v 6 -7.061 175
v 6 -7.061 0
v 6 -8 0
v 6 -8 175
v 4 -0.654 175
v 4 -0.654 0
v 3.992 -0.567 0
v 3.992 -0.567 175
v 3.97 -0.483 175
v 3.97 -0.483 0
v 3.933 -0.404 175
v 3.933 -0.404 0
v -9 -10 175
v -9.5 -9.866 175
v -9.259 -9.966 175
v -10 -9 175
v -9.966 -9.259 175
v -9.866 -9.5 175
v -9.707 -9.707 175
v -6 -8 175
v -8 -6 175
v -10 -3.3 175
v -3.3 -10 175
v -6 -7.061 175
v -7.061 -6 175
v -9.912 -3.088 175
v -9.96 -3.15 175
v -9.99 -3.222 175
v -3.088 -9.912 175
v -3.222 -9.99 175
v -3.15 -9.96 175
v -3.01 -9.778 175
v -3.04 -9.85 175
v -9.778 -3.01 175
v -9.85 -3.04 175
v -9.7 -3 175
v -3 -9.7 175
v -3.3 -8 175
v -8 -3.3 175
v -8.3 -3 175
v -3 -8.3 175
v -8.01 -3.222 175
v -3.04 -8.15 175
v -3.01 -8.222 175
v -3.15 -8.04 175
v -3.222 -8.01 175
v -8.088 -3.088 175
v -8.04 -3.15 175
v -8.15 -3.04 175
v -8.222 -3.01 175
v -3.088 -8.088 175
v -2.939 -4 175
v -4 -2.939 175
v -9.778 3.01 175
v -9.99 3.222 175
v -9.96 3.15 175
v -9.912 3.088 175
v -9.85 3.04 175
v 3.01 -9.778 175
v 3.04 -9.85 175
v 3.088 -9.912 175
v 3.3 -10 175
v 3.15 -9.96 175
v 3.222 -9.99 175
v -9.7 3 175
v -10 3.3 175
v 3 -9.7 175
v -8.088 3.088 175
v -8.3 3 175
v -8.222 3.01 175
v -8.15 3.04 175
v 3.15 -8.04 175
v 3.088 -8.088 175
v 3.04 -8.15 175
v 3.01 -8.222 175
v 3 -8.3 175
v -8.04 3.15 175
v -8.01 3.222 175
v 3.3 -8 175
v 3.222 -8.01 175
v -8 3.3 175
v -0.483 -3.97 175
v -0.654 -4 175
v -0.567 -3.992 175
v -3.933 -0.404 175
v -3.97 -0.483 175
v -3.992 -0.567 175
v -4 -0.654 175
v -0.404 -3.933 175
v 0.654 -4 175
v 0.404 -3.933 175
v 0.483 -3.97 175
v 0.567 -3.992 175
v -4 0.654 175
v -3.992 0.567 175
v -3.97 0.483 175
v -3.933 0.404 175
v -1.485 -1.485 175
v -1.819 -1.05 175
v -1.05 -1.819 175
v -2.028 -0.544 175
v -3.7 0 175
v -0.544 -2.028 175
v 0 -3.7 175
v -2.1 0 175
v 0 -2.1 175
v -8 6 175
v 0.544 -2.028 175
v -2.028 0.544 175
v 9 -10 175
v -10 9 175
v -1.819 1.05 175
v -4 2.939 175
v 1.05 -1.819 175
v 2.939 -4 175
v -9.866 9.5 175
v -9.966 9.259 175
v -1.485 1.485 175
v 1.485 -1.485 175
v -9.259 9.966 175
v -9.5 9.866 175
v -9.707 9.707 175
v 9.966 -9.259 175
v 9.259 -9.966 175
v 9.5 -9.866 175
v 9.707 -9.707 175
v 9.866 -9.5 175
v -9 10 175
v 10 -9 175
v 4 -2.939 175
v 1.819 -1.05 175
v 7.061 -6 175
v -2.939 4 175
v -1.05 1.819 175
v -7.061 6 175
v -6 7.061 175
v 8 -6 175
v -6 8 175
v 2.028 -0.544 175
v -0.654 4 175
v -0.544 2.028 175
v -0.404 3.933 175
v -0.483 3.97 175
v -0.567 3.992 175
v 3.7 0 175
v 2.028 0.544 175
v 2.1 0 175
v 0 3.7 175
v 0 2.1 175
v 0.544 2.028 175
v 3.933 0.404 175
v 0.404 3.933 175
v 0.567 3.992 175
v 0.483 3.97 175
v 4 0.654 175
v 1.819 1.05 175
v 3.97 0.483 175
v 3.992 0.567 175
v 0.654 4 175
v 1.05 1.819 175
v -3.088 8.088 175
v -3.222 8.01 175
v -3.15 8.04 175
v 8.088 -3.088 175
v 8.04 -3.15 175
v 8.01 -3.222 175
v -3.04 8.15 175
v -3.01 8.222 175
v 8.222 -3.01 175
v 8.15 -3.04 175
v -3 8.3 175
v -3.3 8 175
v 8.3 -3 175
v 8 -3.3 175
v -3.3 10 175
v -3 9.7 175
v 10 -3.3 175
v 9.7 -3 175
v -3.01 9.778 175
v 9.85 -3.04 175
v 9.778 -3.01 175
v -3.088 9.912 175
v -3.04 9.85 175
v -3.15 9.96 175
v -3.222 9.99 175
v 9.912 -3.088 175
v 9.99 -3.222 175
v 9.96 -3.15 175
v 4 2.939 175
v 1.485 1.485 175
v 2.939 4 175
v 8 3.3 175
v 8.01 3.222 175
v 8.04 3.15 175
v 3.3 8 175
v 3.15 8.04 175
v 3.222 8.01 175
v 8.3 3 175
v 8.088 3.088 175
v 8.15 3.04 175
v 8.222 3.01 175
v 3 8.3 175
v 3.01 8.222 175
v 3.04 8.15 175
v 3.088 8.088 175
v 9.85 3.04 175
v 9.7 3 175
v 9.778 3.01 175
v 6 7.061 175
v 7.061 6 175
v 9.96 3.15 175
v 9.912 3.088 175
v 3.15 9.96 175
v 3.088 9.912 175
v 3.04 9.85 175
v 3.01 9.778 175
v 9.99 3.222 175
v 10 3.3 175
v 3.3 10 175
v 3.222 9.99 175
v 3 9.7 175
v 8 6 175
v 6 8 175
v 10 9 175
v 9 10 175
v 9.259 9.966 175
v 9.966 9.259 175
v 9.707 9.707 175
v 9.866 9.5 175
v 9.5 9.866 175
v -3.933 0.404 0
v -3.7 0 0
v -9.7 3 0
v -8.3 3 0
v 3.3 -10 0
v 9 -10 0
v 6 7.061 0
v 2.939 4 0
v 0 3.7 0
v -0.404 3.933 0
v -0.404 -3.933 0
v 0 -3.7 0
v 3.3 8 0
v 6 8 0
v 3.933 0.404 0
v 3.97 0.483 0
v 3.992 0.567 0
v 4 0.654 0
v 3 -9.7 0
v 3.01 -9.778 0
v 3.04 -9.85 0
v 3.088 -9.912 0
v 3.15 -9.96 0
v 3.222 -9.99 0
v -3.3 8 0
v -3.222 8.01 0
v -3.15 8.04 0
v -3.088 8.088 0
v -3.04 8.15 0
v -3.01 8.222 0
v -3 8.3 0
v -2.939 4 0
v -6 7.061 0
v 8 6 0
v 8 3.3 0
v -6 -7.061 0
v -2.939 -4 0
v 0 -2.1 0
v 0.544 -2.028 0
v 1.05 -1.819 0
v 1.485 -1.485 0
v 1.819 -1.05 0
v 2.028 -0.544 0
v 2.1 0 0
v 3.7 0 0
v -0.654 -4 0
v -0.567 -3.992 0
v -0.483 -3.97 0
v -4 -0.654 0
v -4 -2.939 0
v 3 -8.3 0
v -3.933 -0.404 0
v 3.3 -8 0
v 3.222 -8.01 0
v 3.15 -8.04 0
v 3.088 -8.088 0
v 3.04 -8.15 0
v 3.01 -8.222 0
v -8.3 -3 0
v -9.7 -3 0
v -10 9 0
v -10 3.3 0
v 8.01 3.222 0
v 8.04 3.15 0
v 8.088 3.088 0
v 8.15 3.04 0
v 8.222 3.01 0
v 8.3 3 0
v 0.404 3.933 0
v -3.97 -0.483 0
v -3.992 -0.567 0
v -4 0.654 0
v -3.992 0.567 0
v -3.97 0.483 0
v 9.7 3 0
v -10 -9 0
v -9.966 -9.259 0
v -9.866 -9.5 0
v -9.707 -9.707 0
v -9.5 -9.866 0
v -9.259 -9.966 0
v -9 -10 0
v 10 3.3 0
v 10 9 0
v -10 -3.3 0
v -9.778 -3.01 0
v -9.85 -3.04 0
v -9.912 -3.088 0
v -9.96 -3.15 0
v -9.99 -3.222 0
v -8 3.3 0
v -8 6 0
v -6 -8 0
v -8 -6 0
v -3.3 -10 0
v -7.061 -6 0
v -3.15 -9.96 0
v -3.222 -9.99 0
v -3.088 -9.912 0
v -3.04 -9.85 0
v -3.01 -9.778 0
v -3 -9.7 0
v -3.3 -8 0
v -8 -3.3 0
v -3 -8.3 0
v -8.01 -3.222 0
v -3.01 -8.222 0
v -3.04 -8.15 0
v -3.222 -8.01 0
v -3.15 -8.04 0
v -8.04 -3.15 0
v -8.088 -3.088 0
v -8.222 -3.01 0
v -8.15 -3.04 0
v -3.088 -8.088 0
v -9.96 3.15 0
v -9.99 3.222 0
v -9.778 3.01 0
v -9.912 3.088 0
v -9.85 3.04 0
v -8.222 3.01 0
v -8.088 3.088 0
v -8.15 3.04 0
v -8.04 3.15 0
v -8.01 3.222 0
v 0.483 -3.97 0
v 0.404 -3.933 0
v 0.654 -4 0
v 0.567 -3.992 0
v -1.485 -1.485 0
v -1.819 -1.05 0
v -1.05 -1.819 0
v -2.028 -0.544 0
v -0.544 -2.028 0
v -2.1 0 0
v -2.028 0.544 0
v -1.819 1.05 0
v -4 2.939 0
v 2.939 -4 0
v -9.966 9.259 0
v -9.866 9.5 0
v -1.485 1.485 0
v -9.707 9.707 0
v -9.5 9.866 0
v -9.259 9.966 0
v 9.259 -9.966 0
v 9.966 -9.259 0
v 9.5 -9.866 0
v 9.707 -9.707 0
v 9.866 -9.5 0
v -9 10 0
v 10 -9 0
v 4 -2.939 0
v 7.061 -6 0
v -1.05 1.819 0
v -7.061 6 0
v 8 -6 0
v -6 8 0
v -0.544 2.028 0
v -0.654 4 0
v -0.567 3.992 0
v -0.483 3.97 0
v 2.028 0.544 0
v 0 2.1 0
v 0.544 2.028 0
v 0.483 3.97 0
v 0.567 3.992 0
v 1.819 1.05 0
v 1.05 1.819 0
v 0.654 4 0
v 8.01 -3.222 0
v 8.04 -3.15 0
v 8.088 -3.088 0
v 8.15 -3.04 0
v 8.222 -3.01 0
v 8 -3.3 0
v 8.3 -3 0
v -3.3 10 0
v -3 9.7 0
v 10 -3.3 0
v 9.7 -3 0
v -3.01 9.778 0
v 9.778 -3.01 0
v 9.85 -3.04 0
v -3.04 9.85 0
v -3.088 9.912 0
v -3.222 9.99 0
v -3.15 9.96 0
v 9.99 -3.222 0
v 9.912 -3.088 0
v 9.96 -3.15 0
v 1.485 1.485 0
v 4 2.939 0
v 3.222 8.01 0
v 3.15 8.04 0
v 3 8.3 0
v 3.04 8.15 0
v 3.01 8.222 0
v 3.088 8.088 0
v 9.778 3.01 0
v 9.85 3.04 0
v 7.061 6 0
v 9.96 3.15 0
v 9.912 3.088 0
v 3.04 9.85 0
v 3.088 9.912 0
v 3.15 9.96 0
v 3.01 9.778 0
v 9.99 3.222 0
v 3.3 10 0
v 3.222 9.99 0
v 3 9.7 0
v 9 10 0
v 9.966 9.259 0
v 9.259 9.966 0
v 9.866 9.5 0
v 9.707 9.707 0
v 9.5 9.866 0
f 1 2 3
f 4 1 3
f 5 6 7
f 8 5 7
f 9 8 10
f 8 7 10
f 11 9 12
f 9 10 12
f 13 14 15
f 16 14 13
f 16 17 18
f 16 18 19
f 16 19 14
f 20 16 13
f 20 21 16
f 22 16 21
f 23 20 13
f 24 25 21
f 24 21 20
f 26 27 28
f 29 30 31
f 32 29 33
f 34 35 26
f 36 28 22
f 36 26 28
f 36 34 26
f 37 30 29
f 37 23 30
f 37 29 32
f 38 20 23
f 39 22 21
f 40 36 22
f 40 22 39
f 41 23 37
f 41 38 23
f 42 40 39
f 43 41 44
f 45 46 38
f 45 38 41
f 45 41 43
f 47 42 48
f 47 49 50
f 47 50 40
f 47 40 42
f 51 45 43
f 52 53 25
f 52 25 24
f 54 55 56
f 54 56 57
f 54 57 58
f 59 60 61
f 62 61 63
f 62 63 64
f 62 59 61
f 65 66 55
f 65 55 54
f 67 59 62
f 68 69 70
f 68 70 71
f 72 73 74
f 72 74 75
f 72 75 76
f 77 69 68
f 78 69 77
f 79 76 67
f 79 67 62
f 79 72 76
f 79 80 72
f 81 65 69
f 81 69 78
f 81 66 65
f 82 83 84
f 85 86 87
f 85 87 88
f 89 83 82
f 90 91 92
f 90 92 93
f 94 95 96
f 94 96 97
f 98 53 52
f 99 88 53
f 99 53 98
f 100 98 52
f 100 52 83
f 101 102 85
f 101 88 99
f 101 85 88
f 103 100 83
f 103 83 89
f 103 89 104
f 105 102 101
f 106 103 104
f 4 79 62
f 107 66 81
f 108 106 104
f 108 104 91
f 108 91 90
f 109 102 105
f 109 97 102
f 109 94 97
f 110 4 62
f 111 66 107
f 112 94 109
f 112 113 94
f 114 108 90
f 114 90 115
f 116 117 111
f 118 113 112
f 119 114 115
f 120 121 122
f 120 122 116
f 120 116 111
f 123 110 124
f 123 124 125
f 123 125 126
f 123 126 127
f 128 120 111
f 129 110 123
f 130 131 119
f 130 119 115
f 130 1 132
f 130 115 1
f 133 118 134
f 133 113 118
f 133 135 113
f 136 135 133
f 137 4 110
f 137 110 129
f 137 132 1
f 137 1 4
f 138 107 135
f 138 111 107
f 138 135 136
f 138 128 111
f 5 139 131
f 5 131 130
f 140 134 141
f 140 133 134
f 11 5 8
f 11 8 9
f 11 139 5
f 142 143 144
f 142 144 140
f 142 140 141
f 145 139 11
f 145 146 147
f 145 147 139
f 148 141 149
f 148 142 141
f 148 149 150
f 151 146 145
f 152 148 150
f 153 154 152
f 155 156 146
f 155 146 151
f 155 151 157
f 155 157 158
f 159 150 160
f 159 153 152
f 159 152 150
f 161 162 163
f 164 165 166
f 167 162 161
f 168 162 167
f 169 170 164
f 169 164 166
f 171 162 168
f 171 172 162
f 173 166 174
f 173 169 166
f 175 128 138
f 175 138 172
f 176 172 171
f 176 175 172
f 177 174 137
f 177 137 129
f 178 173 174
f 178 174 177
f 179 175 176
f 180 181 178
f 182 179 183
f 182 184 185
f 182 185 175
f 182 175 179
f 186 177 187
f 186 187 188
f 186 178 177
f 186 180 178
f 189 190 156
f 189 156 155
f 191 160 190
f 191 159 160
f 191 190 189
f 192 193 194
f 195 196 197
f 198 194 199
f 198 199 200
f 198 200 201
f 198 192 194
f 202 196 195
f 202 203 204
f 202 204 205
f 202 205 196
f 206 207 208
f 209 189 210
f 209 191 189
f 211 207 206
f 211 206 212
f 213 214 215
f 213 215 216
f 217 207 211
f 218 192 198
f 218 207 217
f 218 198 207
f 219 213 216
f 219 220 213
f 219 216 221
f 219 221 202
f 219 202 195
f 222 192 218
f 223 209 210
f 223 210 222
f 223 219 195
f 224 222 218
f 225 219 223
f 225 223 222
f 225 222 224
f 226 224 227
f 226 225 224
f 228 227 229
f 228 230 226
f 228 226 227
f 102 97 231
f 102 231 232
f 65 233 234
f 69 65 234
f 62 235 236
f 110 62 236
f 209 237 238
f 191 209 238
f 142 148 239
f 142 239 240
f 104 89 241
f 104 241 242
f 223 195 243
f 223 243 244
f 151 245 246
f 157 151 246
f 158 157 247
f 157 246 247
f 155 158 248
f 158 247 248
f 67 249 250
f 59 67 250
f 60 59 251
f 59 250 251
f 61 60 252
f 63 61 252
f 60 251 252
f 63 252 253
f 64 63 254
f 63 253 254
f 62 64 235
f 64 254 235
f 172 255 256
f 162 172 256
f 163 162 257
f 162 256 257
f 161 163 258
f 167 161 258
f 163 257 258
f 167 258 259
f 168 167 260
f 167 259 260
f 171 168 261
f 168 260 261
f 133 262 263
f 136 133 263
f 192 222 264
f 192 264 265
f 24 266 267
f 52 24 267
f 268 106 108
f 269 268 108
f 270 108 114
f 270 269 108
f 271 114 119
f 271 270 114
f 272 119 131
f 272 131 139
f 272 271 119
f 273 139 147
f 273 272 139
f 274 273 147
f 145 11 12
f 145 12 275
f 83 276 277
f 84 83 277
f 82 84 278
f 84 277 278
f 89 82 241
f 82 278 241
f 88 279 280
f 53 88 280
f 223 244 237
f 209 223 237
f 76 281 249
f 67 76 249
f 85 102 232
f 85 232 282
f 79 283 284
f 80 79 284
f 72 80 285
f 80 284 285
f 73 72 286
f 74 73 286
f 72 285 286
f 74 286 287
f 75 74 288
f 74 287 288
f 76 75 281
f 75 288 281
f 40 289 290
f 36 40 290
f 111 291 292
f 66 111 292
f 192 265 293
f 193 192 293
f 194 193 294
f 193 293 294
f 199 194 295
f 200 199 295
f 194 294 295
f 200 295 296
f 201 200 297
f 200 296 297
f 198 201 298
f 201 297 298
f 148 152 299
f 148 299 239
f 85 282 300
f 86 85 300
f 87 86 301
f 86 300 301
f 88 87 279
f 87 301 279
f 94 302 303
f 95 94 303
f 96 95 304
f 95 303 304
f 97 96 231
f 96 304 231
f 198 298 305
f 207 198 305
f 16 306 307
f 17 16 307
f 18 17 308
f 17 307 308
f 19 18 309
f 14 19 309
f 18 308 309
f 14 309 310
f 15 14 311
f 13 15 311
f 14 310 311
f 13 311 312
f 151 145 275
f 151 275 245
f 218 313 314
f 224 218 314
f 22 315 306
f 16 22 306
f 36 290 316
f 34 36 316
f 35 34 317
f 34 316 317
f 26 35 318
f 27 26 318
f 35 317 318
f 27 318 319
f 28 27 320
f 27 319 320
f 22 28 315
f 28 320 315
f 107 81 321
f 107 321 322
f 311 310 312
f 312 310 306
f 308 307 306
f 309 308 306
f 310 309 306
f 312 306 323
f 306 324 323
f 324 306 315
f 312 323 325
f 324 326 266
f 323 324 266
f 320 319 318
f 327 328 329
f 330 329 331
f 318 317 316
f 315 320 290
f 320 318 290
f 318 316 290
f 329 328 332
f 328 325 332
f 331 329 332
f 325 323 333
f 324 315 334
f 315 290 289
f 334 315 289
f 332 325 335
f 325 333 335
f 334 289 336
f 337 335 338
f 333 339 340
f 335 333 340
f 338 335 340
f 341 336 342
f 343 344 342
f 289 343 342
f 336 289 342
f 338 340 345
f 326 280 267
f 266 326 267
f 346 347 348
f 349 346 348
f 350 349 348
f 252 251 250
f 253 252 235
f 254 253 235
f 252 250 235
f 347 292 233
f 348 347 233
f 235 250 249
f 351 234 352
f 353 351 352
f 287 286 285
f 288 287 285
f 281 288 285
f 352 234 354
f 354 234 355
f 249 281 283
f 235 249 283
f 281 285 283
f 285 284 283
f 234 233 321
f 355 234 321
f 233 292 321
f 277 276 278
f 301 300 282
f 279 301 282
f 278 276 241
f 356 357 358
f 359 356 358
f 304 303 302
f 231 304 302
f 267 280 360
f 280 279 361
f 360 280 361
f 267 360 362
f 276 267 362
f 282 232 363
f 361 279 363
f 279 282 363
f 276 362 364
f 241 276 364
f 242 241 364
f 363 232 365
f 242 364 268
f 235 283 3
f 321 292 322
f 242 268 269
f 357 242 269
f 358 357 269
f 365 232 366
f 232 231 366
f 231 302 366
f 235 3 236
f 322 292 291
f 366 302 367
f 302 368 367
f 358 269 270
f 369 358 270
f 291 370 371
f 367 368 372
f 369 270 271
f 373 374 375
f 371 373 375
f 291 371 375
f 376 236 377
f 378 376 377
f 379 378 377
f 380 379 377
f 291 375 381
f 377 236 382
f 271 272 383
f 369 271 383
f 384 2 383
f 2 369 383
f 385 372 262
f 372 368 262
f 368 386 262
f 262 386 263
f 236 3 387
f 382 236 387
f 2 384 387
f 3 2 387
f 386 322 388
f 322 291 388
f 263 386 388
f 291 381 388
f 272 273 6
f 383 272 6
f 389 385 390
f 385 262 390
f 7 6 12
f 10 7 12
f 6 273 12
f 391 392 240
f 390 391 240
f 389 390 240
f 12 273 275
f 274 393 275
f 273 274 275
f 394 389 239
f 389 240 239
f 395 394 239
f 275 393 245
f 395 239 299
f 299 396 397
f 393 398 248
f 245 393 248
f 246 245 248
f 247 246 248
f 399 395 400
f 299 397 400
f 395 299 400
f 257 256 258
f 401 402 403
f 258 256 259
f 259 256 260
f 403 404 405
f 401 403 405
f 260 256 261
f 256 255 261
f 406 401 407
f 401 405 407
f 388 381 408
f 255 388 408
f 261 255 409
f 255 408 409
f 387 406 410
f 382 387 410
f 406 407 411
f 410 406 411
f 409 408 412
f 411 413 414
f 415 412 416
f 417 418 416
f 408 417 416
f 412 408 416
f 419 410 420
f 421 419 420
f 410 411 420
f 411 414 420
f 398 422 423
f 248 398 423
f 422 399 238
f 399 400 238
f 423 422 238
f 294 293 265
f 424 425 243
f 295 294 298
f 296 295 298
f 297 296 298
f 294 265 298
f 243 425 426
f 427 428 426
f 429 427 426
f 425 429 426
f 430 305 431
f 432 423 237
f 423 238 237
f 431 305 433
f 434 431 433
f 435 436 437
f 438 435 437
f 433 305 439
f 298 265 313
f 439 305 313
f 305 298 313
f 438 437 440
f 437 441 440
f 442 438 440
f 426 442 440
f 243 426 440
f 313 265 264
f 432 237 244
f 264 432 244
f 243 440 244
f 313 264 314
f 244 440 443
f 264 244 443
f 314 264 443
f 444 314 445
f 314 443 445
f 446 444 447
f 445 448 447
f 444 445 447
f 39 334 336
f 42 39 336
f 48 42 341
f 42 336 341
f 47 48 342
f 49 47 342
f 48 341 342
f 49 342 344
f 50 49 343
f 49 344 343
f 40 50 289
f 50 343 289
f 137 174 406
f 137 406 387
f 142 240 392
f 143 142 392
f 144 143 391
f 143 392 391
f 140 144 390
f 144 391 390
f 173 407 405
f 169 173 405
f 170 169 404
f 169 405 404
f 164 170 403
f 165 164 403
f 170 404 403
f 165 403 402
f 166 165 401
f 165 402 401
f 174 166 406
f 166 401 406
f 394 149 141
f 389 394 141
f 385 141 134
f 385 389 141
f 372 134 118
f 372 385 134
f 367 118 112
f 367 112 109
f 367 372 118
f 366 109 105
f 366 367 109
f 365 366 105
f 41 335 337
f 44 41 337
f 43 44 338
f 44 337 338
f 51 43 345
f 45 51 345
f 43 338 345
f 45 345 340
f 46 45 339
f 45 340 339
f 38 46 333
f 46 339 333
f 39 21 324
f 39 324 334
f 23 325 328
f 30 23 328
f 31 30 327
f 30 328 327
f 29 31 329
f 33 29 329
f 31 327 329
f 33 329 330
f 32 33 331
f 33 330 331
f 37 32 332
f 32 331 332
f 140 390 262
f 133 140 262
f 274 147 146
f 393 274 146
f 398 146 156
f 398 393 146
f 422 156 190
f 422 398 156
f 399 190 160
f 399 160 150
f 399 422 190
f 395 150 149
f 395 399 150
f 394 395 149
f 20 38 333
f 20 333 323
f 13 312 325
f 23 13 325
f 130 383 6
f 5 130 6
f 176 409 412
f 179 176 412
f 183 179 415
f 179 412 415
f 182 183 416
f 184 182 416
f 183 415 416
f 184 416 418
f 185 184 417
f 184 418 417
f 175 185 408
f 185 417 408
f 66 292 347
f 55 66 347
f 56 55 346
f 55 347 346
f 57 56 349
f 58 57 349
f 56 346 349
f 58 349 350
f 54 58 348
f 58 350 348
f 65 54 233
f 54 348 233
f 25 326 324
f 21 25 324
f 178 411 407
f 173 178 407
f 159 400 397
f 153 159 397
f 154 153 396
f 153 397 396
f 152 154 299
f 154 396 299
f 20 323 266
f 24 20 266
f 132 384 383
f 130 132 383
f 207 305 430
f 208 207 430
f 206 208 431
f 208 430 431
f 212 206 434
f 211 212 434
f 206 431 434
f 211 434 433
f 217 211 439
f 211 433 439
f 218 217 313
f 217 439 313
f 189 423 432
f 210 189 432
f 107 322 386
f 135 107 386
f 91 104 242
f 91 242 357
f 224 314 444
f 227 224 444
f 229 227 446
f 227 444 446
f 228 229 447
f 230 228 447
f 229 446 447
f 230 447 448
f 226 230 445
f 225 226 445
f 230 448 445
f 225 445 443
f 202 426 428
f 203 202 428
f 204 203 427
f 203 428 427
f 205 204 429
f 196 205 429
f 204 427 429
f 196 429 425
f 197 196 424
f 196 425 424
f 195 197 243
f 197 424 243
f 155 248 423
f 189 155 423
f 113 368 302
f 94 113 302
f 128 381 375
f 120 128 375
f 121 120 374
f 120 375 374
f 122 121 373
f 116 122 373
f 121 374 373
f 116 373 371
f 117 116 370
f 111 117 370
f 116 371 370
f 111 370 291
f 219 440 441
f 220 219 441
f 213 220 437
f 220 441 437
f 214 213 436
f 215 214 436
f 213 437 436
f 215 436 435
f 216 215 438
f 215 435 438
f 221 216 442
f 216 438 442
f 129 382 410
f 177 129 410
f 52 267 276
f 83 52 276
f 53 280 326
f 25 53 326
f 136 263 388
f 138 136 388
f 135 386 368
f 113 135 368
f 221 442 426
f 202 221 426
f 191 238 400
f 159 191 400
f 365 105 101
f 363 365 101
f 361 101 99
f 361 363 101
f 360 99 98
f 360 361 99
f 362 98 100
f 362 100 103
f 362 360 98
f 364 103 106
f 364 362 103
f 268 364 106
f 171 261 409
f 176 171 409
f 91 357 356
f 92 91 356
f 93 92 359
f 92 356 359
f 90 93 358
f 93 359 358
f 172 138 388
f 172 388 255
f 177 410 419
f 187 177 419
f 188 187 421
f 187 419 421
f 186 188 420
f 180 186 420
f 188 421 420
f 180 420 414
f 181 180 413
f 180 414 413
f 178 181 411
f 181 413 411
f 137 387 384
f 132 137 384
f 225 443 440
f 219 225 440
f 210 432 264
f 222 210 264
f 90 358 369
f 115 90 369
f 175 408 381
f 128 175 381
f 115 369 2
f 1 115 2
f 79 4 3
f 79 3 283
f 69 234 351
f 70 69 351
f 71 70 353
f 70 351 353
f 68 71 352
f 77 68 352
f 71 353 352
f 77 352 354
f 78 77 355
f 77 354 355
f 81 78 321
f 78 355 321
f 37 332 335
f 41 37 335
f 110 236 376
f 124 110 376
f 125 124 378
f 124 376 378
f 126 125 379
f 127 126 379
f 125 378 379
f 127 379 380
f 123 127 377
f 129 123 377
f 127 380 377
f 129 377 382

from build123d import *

# Parameters (mm, degrees)
BOSS_EXTRUDE1_DEPTH = 175


with BuildPart() as part:
    # Model → Boss-Extrude1 (new body)
    with BuildSketch(Plane.XY):
        with BuildLine():
            Line((-3, 8.3), (-3, 9.7))
            ThreePointArc((-3, 9.7), (-3.087867966, 9.912132034), (-3.3, 10))
            Line((-3.3, 10), (-9, 10))
            ThreePointArc((-9, 10), (-9.707106781, 9.707106781), (-10, 9))
            Line((-10, 9), (-10, 3.3))
            ThreePointArc((-10, 3.3), (-9.912132034, 3.087867966), (-9.7, 3))
            Line((-9.7, 3), (-8.3, 3))
            ThreePointArc((-8.3, 3), (-8.087867966, 3.087867966), (-8, 3.3))
            Line((-8, 3.3), (-8, 6))
            Line((-8, 6), (-7.060660172, 6))
            Line((-7.060660172, 6), (-4, 2.939339828))
            Line((-4, 2.939339828), (-4, 0.653589838))
            ThreePointArc((-4, 0.653589838), (-3.982962913, 0.524180316), (-3.933012702, 0.403589838))
            Line((-3.933012702, 0.403589838), (-3.7, 0))
            Line((-3.7, 0), (-3.933012702, -0.403589838))
            ThreePointArc((-3.933012702, -0.403589838), (-3.982962913, -0.524180316), (-4, -0.653589838))
            Line((-4, -0.653589838), (-4, -2.939339828))
            Line((-4, -2.939339828), (-7.060660172, -6))
            Line((-7.060660172, -6), (-8, -6))
            Line((-8, -6), (-8, -3.3))
            ThreePointArc((-8, -3.3), (-8.087867966, -3.087867966), (-8.3, -3))
            Line((-8.3, -3), (-9.7, -3))
            ThreePointArc((-9.7, -3), (-9.912132034, -3.087867966), (-10, -3.3))
            Line((-10, -3.3), (-10, -9))
            ThreePointArc((-10, -9), (-9.707106781, -9.707106781), (-9, -10))
            Line((-9, -10), (-3.3, -10))
            ThreePointArc((-3.3, -10), (-3.087867966, -9.912132034), (-3, -9.7))
            Line((-3, -9.7), (-3, -8.3))
            ThreePointArc((-3, -8.3), (-3.087867966, -8.087867966), (-3.3, -8))
            Line((-3.3, -8), (-6, -8))
            Line((-6, -8), (-6, -7.060660172))
            Line((-6, -7.060660172), (-2.939339828, -4))
            Line((-2.939339828, -4), (-0.653589838, -4))
            ThreePointArc((-0.653589838, -4), (-0.524180316, -3.982962913), (-0.403589838, -3.933012702))
            Line((-0.403589838, -3.933012702), (0, -3.7))
            Line((0, -3.7), (0.403589838, -3.933012702))
            ThreePointArc((0.403589838, -3.933012702), (0.524180316, -3.982962913), (0.653589838, -4))
            Line((0.653589838, -4), (2.939339828, -4))
            Line((2.939339828, -4), (6, -7.060660172))
            Line((6, -7.060660172), (6, -8))
            Line((6, -8), (3.3, -8))
            ThreePointArc((3.3, -8), (3.087867966, -8.087867966), (3, -8.3))
            Line((3, -8.3), (3, -9.7))
            ThreePointArc((3, -9.7), (3.087867966, -9.912132034), (3.3, -10))
            Line((3.3, -10), (9, -10))
            ThreePointArc((9, -10), (9.707106781, -9.707106781), (10, -9))
            Line((10, -9), (10, -3.3))
            ThreePointArc((10, -3.3), (9.912132034, -3.087867966), (9.7, -3))
            Line((9.7, -3), (8.3, -3))
            ThreePointArc((8.3, -3), (8.087867966, -3.087867966), (8, -3.3))
            Line((8, -3.3), (8, -6))
            Line((8, -6), (7.060660172, -6))
            Line((7.060660172, -6), (4, -2.939339828))
            Line((4, -2.939339828), (4, -0.653589838))
            ThreePointArc((4, -0.653589838), (3.982962913, -0.524180316), (3.933012702, -0.403589838))
            Line((3.933012702, -0.403589838), (3.7, 0))
            Line((3.7, 0), (3.933012702, 0.403589838))
            ThreePointArc((3.933012702, 0.403589838), (3.982962913, 0.524180316), (4, 0.653589838))
            Line((4, 0.653589838), (4, 2.939339828))
            Line((4, 2.939339828), (7.060660172, 6))
            Line((7.060660172, 6), (8, 6))
            Line((8, 6), (8, 3.3))
            ThreePointArc((8, 3.3), (8.087867966, 3.087867966), (8.3, 3))
            Line((8.3, 3), (9.7, 3))
            ThreePointArc((9.7, 3), (9.912132034, 3.087867966), (10, 3.3))
            Line((10, 3.3), (10, 9))
            ThreePointArc((10, 9), (9.707106781, 9.707106781), (9, 10))
            Line((9, 10), (3.3, 10))
            ThreePointArc((3.3, 10), (3.087867966, 9.912132034), (3, 9.7))
            Line((3, 9.7), (3, 8.3))
            ThreePointArc((3, 8.3), (3.087867966, 8.087867966), (3.3, 8))
            Line((3.3, 8), (6, 8))
            Line((6, 8), (6, 7.060660172))
            Line((6, 7.060660172), (2.939339828, 4))
            Line((2.939339828, 4), (0.653589838, 4))
            ThreePointArc((0.653589838, 4), (0.524180316, 3.982962913), (0.403589838, 3.933012702))
            Line((0.403589838, 3.933012702), (0, 3.7))
            Line((0, 3.7), (-0.403589838, 3.933012702))
            ThreePointArc((-0.403589838, 3.933012702), (-0.524180316, 3.982962913), (-0.653589838, 4))
            Line((-0.653589838, 4), (-2.939339828, 4))
            Line((-2.939339828, 4), (-6, 7.060660172))
            Line((-6, 7.060660172), (-6, 8))
            Line((-6, 8), (-3.3, 8))
            ThreePointArc((-3.3, 8), (-3.087867966, 8.087867966), (-3, 8.3))
        make_face()
        with BuildLine():
            ThreePointArc((-2.1, 0), (-1.48492424, -1.48492424), (0, -2.1))
            ThreePointArc((0, -2.1), (1.48492424, -1.48492424), (2.1, 0))
            ThreePointArc((2.1, 0), (1.48492424, 1.48492424), (0, 2.1))
            ThreePointArc((0, 2.1), (-1.48492424, 1.48492424), (-2.1, 0))
        make_face(mode=Mode.SUBTRACT)
    extrude(amount=BOSS_EXTRUDE1_DEPTH)


solid = part.part
